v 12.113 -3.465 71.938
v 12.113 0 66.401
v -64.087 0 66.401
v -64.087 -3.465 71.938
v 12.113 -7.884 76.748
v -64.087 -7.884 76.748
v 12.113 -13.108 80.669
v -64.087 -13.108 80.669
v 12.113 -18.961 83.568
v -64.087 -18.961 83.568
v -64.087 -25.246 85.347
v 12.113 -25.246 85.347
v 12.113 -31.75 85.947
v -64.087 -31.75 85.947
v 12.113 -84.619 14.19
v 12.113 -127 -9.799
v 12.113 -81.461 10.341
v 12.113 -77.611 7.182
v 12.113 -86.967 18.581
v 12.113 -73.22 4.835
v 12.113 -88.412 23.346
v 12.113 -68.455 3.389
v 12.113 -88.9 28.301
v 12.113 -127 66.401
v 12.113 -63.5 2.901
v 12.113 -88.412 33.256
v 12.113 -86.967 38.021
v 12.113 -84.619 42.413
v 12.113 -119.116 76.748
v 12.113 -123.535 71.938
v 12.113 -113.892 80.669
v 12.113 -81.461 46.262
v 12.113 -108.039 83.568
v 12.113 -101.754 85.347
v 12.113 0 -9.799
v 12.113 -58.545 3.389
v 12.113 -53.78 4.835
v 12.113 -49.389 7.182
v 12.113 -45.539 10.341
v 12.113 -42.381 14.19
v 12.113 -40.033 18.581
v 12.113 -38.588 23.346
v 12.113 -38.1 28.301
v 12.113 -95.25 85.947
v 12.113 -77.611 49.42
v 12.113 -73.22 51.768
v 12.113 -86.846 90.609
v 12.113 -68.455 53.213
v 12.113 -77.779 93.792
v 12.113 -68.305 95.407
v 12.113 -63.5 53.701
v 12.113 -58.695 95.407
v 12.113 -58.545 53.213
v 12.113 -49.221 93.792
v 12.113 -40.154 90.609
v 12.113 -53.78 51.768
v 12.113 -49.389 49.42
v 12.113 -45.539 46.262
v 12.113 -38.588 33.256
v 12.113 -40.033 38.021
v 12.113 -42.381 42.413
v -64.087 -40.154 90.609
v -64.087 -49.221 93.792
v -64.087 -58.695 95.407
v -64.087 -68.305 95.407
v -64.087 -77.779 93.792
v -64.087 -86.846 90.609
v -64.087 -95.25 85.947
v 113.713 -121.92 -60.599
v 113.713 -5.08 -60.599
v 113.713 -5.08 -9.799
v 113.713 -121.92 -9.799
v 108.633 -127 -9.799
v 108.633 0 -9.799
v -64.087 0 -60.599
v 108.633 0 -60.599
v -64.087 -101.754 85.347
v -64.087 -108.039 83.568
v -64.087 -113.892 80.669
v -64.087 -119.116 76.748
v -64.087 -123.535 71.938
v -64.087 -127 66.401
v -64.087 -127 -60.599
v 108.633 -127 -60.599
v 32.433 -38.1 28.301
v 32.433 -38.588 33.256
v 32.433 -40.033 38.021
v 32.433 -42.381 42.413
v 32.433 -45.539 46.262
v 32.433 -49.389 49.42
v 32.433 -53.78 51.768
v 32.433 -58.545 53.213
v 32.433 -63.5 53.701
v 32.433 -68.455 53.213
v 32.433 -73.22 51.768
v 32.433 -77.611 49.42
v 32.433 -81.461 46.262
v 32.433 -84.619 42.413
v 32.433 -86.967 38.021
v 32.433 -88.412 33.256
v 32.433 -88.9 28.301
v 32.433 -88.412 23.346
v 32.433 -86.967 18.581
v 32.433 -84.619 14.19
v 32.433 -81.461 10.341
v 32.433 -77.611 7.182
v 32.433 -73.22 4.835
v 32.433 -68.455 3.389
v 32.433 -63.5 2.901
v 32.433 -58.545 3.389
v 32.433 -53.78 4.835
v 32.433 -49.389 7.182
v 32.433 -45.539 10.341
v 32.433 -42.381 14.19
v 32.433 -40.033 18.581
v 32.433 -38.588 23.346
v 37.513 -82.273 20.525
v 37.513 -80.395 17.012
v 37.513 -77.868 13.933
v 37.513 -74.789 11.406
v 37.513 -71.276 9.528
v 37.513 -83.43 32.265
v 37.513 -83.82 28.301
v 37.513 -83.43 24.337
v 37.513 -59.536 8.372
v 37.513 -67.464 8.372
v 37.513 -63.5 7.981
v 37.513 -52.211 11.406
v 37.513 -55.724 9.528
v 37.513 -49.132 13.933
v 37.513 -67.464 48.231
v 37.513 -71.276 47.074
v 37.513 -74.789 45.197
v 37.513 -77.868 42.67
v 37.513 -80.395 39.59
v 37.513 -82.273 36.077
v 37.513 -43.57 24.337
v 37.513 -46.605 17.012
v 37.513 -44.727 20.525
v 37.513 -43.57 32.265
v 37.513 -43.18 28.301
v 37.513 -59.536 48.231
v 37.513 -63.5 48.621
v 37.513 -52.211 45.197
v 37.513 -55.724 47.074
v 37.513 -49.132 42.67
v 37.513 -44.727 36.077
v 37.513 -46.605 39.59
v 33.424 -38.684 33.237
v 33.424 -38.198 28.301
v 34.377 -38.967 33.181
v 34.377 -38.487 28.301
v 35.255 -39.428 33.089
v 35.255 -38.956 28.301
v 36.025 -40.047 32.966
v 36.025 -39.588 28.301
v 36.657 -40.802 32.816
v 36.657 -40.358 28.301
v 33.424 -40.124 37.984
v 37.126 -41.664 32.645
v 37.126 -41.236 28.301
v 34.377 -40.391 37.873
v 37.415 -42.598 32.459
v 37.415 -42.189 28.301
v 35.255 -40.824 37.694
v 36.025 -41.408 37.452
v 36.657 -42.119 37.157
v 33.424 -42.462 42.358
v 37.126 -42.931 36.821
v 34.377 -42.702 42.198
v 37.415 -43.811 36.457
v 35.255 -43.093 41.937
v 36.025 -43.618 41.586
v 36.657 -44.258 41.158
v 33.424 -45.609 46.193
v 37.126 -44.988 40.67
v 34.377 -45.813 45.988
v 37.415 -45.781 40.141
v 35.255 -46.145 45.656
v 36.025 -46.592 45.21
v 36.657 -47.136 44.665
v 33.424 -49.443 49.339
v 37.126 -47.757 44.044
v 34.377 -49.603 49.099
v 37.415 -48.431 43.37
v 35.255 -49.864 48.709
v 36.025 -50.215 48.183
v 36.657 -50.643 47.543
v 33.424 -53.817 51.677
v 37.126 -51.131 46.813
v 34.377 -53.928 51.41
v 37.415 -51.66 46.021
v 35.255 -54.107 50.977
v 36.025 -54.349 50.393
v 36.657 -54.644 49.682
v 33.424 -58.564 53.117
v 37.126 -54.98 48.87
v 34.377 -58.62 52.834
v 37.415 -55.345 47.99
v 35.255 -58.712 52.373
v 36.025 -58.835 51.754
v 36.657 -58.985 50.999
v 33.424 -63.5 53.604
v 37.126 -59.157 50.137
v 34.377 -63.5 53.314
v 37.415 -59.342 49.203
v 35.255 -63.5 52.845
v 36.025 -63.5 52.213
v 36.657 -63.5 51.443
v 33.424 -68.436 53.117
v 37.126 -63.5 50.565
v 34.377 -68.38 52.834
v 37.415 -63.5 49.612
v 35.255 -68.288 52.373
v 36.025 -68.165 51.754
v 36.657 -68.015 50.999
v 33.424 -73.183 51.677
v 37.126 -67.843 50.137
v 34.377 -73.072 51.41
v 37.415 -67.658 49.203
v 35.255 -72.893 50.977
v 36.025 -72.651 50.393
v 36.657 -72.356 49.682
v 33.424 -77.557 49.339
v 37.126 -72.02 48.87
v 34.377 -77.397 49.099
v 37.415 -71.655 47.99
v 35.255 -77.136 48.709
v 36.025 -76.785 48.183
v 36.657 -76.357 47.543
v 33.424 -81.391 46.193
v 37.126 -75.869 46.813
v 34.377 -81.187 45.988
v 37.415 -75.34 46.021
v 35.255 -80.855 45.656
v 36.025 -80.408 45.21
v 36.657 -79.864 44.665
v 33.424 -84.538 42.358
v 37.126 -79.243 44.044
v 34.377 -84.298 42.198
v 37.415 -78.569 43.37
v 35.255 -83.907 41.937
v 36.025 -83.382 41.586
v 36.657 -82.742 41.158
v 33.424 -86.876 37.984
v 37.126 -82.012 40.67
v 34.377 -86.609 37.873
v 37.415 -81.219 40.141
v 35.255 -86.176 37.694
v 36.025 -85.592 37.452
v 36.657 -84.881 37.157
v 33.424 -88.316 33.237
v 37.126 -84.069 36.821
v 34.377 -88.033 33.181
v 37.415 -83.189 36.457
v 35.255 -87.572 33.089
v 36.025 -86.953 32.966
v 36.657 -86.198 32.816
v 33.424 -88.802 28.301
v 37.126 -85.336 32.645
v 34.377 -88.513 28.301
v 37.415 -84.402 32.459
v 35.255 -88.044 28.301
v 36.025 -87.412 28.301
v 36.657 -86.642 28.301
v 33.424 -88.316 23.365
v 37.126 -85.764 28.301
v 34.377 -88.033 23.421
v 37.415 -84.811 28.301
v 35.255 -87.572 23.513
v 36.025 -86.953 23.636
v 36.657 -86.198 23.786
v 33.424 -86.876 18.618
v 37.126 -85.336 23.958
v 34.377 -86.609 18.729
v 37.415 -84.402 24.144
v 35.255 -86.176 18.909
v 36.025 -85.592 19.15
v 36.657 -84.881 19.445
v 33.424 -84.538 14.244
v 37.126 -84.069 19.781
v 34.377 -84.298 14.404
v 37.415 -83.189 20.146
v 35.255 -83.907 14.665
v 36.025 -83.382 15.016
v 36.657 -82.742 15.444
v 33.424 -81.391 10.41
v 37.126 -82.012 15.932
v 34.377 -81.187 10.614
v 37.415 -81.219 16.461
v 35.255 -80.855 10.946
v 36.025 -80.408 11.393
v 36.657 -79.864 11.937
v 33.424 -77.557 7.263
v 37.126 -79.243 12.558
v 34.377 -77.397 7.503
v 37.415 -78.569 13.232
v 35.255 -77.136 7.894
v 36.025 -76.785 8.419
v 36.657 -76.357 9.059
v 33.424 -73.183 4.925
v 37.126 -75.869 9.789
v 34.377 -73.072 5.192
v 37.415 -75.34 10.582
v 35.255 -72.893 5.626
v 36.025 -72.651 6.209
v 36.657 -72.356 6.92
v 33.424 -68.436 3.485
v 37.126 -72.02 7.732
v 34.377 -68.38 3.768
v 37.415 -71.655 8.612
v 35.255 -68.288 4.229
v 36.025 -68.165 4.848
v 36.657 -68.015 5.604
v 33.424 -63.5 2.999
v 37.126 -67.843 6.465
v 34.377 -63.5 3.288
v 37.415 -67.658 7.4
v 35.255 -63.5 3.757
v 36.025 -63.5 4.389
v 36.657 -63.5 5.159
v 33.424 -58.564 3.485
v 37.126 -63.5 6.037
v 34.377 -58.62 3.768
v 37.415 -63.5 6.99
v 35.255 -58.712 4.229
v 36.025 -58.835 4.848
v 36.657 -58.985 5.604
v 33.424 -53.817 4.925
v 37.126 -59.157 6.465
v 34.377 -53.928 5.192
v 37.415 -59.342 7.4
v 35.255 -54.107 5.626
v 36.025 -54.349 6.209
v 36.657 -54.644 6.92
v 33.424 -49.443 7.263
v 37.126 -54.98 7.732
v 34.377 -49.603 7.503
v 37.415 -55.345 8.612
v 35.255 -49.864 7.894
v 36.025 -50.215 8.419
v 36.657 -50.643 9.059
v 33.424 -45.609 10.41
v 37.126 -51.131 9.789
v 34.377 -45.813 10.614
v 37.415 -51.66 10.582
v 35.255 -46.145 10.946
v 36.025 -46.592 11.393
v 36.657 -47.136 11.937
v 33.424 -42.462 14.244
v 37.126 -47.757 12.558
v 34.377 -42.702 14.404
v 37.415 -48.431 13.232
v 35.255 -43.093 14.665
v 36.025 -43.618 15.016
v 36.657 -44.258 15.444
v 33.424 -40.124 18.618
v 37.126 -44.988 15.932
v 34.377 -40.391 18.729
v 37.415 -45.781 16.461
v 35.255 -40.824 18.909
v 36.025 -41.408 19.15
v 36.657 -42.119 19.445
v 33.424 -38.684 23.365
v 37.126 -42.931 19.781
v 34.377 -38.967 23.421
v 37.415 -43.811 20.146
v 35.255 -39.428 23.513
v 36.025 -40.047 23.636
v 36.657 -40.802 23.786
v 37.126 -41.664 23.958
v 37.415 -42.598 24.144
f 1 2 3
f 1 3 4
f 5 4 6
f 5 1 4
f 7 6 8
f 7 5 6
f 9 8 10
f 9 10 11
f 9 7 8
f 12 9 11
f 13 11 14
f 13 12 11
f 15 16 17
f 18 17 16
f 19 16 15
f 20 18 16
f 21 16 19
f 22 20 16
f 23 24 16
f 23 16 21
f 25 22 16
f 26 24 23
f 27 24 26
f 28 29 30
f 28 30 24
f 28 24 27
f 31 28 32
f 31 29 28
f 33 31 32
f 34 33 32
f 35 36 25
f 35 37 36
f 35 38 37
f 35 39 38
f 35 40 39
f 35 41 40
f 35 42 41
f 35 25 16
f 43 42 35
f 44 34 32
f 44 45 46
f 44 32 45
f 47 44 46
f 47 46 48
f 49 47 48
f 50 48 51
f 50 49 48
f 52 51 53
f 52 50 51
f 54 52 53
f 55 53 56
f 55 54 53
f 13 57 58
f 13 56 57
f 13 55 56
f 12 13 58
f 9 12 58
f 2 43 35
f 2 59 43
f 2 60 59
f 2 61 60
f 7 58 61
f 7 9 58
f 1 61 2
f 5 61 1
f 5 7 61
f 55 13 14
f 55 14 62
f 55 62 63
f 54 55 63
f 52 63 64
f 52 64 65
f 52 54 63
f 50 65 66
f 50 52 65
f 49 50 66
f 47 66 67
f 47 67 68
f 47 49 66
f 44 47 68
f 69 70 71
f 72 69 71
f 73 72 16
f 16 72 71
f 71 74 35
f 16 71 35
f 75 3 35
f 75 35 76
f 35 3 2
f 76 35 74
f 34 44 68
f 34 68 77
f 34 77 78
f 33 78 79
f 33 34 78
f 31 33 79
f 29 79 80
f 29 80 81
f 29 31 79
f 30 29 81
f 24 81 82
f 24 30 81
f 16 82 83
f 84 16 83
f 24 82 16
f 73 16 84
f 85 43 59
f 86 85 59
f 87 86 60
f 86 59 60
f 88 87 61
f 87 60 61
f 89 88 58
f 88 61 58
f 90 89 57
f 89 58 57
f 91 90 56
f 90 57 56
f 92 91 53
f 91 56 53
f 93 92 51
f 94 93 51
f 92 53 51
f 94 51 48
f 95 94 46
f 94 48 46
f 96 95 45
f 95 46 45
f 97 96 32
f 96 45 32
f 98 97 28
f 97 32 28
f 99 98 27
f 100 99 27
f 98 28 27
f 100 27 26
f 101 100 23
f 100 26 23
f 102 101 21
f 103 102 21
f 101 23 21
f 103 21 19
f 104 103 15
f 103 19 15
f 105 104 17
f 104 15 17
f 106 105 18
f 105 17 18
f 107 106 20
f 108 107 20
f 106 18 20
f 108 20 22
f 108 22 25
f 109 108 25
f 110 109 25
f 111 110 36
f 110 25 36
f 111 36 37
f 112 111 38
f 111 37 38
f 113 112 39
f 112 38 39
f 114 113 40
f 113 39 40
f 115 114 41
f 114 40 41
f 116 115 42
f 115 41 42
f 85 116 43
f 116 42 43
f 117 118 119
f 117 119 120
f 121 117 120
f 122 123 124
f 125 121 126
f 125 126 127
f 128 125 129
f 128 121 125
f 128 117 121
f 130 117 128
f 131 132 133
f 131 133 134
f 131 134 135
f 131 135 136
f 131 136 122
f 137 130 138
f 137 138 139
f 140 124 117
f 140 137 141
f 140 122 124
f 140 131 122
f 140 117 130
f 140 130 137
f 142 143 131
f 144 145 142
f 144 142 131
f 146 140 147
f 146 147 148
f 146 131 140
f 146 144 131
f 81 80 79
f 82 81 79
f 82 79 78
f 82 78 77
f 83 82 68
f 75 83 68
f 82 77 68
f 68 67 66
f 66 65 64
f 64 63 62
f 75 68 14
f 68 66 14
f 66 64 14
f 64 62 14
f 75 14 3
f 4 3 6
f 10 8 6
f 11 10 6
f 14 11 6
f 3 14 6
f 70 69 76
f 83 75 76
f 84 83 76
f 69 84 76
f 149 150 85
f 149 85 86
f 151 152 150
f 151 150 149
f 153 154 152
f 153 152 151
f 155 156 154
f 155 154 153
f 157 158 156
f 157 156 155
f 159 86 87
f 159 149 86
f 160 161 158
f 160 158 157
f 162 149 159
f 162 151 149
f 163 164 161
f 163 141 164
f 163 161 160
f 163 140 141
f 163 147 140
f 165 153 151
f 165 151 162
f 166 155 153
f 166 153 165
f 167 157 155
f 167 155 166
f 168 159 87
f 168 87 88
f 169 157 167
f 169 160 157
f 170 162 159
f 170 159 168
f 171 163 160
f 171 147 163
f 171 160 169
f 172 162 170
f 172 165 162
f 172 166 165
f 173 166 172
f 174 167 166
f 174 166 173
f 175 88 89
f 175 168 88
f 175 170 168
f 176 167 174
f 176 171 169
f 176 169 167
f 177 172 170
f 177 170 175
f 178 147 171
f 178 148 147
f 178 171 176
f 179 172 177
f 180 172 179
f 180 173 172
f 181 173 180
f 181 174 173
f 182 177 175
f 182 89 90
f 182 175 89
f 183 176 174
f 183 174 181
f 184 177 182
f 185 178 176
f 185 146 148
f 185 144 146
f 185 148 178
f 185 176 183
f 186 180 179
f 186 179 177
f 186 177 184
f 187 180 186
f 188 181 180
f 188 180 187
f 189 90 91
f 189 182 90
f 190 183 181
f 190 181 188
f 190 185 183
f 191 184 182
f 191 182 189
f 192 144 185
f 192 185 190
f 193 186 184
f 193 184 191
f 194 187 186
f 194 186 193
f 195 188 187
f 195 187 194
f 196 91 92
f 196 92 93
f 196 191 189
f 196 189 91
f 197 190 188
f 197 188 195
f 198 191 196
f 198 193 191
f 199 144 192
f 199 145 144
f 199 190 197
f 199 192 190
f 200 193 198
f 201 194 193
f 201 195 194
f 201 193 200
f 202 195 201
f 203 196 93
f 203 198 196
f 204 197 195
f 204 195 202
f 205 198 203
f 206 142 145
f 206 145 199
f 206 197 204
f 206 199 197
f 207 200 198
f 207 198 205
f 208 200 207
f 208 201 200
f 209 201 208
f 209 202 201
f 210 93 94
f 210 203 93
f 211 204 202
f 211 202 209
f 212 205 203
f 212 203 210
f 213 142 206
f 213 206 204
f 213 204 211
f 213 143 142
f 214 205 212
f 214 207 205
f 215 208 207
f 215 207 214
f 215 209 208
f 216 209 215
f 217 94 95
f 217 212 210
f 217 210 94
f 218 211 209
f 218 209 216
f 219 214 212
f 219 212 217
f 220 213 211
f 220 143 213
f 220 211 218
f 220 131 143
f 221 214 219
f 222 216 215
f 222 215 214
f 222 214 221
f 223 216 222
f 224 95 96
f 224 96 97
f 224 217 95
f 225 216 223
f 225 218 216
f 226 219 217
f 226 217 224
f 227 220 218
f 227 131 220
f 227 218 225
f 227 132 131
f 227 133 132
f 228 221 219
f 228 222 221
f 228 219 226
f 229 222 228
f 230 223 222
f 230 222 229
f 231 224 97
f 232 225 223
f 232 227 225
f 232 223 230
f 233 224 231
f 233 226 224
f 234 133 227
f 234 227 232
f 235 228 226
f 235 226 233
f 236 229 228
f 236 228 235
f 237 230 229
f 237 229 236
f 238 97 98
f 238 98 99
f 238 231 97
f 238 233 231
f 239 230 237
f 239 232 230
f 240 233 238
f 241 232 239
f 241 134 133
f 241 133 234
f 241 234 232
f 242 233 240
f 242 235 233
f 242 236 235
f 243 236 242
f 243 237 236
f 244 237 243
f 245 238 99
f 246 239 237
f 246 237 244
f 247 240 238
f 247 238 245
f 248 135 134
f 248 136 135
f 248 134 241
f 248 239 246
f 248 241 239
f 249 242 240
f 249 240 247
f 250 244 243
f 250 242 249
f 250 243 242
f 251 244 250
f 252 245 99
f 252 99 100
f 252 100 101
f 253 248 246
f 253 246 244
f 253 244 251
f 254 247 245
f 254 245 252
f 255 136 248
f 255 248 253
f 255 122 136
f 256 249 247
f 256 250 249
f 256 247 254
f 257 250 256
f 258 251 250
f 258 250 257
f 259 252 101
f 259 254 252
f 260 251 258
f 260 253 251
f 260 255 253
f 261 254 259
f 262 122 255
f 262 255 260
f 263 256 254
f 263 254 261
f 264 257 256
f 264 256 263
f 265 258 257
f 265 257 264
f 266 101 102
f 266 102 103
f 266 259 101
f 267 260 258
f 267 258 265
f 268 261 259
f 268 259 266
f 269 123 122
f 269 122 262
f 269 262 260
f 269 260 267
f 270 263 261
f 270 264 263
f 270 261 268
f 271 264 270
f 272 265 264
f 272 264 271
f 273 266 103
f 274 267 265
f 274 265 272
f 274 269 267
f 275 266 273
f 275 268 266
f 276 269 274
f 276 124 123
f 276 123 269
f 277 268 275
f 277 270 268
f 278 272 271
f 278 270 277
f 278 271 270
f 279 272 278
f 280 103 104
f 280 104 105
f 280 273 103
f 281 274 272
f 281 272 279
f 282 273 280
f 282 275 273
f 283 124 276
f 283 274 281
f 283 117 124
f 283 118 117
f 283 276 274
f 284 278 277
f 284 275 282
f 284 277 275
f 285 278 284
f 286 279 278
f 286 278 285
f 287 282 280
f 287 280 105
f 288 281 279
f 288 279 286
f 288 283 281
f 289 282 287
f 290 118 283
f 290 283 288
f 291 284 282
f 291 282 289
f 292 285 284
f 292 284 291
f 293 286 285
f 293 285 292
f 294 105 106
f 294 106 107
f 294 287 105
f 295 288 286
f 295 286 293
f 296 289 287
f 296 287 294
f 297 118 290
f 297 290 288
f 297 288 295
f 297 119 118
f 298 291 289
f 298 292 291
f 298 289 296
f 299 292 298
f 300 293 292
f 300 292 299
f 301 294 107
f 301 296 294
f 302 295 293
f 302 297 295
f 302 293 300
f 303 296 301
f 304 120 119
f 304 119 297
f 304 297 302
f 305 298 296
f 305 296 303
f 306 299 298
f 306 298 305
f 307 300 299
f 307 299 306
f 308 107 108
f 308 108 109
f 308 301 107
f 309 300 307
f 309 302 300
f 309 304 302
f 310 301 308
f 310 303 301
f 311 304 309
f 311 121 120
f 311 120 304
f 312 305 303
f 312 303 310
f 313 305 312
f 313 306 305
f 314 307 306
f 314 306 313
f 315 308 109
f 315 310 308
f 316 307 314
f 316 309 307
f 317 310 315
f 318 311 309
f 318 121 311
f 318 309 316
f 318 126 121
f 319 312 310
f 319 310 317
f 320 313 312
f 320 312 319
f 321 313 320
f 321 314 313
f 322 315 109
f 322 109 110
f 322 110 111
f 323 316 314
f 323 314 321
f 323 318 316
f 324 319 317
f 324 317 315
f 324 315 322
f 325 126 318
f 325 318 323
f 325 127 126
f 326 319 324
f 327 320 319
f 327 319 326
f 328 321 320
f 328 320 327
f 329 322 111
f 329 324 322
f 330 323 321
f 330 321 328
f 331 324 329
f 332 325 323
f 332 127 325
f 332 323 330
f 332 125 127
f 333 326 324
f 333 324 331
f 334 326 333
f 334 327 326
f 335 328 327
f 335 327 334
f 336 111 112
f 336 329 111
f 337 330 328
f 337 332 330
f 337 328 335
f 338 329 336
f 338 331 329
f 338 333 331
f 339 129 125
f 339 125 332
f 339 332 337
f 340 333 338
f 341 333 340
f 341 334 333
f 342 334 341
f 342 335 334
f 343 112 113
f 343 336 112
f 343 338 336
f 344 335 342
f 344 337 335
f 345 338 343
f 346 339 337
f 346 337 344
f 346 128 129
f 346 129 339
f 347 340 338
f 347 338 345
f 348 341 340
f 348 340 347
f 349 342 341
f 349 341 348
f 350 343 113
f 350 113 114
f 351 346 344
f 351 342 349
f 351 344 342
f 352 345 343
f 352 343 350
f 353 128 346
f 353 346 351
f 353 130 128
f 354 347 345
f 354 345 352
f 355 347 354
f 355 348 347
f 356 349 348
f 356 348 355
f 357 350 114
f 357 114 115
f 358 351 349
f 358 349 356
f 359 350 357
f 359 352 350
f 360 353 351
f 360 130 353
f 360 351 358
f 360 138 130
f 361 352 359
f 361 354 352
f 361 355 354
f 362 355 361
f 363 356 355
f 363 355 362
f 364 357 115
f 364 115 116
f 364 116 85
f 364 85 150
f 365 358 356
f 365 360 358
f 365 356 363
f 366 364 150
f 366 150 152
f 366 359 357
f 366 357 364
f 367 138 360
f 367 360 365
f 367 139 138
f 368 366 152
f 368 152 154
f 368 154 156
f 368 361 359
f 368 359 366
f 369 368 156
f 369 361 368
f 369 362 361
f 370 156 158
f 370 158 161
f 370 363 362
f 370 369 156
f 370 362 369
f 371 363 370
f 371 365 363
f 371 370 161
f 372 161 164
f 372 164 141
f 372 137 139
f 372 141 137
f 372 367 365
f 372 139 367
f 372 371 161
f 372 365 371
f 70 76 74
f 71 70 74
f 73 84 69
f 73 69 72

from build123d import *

# Parameters (mm, degrees)
F0_W     = 76.2
F0_H     = 76.2
F1_DEPTH = 127
F2_SIZE  = 5.08
F3_R     = 25.4
F4_DEPTH = 25.4
F5_R     = 5.08
F6_DEPTH = 76.2


with BuildPart() as f1:
    # F0 (on Front) → F1 (new body)
    with BuildSketch(Plane.XZ):
        Polygon((12.112662, -9.798872), (-64.087338, -9.798872), (-64.087338, -60.598872), (113.712662, -60.598872), (113.712662, -9.798872), align=None)
        with Locations((-25.987338, 28.301128)):
            Rectangle(F0_W, F0_H)
    extrude(amount=F1_DEPTH)

    # F2
    f2_edges = [f1.edges().sort_by_distance(p)[0] for p in [
        (113.712662, -127, -35.198872),
        (113.712662, 0, -35.198872),
    ]]
    chamfer(f2_edges, length=F2_SIZE)

    # F3 (on face) → F4 (join)
    with BuildSketch(Plane.YZ.offset(12.112662)):
        with Locations((-63.5, 28.301128)):
            Circle(F3_R)
    extrude(amount=F4_DEPTH)

    # F5
    f5_edges = [f1.edges().sort_by_distance(p)[0] for p in [
        (37.512662, -88.9, 28.301128),
    ]]
    fillet(f5_edges, radius=F5_R)

    # F3 (on face) → F6 (join)
    with BuildSketch(Plane.YZ.offset(12.112662)):
        with BuildLine():
            ThreePointArc((-31.75, 85.947037), (-50.392056, 80.668836), (-63.5, 66.401128))
            Line((-63.5, 66.401128), (0, 66.401128))
            ThreePointArc((0, 66.401128), (-13.107944, 80.668836), (-31.75, 85.947037))
        make_face()
        with BuildLine():
            ThreePointArc((-95.25, 85.947037), (-76.607944, 80.668836), (-63.5, 66.401128))
            ThreePointArc((-63.5, 66.401128), (-50.392056, 80.668836), (-31.75, 85.947037))
            ThreePointArc((-31.75, 85.947037), (-63.5, 95.609763), (-95.25, 85.947037))
        make_face()
        with BuildLine():
            Line((-127, 66.401128), (-63.5, 66.401128))
            ThreePointArc((-63.5, 66.401128), (-76.607944, 80.668836), (-95.25, 85.947037))
            ThreePointArc((-95.25, 85.947037), (-113.892056, 80.668836), (-127, 66.401128))
        make_face()
    extrude(amount=-F6_DEPTH)


solid = f1.part
